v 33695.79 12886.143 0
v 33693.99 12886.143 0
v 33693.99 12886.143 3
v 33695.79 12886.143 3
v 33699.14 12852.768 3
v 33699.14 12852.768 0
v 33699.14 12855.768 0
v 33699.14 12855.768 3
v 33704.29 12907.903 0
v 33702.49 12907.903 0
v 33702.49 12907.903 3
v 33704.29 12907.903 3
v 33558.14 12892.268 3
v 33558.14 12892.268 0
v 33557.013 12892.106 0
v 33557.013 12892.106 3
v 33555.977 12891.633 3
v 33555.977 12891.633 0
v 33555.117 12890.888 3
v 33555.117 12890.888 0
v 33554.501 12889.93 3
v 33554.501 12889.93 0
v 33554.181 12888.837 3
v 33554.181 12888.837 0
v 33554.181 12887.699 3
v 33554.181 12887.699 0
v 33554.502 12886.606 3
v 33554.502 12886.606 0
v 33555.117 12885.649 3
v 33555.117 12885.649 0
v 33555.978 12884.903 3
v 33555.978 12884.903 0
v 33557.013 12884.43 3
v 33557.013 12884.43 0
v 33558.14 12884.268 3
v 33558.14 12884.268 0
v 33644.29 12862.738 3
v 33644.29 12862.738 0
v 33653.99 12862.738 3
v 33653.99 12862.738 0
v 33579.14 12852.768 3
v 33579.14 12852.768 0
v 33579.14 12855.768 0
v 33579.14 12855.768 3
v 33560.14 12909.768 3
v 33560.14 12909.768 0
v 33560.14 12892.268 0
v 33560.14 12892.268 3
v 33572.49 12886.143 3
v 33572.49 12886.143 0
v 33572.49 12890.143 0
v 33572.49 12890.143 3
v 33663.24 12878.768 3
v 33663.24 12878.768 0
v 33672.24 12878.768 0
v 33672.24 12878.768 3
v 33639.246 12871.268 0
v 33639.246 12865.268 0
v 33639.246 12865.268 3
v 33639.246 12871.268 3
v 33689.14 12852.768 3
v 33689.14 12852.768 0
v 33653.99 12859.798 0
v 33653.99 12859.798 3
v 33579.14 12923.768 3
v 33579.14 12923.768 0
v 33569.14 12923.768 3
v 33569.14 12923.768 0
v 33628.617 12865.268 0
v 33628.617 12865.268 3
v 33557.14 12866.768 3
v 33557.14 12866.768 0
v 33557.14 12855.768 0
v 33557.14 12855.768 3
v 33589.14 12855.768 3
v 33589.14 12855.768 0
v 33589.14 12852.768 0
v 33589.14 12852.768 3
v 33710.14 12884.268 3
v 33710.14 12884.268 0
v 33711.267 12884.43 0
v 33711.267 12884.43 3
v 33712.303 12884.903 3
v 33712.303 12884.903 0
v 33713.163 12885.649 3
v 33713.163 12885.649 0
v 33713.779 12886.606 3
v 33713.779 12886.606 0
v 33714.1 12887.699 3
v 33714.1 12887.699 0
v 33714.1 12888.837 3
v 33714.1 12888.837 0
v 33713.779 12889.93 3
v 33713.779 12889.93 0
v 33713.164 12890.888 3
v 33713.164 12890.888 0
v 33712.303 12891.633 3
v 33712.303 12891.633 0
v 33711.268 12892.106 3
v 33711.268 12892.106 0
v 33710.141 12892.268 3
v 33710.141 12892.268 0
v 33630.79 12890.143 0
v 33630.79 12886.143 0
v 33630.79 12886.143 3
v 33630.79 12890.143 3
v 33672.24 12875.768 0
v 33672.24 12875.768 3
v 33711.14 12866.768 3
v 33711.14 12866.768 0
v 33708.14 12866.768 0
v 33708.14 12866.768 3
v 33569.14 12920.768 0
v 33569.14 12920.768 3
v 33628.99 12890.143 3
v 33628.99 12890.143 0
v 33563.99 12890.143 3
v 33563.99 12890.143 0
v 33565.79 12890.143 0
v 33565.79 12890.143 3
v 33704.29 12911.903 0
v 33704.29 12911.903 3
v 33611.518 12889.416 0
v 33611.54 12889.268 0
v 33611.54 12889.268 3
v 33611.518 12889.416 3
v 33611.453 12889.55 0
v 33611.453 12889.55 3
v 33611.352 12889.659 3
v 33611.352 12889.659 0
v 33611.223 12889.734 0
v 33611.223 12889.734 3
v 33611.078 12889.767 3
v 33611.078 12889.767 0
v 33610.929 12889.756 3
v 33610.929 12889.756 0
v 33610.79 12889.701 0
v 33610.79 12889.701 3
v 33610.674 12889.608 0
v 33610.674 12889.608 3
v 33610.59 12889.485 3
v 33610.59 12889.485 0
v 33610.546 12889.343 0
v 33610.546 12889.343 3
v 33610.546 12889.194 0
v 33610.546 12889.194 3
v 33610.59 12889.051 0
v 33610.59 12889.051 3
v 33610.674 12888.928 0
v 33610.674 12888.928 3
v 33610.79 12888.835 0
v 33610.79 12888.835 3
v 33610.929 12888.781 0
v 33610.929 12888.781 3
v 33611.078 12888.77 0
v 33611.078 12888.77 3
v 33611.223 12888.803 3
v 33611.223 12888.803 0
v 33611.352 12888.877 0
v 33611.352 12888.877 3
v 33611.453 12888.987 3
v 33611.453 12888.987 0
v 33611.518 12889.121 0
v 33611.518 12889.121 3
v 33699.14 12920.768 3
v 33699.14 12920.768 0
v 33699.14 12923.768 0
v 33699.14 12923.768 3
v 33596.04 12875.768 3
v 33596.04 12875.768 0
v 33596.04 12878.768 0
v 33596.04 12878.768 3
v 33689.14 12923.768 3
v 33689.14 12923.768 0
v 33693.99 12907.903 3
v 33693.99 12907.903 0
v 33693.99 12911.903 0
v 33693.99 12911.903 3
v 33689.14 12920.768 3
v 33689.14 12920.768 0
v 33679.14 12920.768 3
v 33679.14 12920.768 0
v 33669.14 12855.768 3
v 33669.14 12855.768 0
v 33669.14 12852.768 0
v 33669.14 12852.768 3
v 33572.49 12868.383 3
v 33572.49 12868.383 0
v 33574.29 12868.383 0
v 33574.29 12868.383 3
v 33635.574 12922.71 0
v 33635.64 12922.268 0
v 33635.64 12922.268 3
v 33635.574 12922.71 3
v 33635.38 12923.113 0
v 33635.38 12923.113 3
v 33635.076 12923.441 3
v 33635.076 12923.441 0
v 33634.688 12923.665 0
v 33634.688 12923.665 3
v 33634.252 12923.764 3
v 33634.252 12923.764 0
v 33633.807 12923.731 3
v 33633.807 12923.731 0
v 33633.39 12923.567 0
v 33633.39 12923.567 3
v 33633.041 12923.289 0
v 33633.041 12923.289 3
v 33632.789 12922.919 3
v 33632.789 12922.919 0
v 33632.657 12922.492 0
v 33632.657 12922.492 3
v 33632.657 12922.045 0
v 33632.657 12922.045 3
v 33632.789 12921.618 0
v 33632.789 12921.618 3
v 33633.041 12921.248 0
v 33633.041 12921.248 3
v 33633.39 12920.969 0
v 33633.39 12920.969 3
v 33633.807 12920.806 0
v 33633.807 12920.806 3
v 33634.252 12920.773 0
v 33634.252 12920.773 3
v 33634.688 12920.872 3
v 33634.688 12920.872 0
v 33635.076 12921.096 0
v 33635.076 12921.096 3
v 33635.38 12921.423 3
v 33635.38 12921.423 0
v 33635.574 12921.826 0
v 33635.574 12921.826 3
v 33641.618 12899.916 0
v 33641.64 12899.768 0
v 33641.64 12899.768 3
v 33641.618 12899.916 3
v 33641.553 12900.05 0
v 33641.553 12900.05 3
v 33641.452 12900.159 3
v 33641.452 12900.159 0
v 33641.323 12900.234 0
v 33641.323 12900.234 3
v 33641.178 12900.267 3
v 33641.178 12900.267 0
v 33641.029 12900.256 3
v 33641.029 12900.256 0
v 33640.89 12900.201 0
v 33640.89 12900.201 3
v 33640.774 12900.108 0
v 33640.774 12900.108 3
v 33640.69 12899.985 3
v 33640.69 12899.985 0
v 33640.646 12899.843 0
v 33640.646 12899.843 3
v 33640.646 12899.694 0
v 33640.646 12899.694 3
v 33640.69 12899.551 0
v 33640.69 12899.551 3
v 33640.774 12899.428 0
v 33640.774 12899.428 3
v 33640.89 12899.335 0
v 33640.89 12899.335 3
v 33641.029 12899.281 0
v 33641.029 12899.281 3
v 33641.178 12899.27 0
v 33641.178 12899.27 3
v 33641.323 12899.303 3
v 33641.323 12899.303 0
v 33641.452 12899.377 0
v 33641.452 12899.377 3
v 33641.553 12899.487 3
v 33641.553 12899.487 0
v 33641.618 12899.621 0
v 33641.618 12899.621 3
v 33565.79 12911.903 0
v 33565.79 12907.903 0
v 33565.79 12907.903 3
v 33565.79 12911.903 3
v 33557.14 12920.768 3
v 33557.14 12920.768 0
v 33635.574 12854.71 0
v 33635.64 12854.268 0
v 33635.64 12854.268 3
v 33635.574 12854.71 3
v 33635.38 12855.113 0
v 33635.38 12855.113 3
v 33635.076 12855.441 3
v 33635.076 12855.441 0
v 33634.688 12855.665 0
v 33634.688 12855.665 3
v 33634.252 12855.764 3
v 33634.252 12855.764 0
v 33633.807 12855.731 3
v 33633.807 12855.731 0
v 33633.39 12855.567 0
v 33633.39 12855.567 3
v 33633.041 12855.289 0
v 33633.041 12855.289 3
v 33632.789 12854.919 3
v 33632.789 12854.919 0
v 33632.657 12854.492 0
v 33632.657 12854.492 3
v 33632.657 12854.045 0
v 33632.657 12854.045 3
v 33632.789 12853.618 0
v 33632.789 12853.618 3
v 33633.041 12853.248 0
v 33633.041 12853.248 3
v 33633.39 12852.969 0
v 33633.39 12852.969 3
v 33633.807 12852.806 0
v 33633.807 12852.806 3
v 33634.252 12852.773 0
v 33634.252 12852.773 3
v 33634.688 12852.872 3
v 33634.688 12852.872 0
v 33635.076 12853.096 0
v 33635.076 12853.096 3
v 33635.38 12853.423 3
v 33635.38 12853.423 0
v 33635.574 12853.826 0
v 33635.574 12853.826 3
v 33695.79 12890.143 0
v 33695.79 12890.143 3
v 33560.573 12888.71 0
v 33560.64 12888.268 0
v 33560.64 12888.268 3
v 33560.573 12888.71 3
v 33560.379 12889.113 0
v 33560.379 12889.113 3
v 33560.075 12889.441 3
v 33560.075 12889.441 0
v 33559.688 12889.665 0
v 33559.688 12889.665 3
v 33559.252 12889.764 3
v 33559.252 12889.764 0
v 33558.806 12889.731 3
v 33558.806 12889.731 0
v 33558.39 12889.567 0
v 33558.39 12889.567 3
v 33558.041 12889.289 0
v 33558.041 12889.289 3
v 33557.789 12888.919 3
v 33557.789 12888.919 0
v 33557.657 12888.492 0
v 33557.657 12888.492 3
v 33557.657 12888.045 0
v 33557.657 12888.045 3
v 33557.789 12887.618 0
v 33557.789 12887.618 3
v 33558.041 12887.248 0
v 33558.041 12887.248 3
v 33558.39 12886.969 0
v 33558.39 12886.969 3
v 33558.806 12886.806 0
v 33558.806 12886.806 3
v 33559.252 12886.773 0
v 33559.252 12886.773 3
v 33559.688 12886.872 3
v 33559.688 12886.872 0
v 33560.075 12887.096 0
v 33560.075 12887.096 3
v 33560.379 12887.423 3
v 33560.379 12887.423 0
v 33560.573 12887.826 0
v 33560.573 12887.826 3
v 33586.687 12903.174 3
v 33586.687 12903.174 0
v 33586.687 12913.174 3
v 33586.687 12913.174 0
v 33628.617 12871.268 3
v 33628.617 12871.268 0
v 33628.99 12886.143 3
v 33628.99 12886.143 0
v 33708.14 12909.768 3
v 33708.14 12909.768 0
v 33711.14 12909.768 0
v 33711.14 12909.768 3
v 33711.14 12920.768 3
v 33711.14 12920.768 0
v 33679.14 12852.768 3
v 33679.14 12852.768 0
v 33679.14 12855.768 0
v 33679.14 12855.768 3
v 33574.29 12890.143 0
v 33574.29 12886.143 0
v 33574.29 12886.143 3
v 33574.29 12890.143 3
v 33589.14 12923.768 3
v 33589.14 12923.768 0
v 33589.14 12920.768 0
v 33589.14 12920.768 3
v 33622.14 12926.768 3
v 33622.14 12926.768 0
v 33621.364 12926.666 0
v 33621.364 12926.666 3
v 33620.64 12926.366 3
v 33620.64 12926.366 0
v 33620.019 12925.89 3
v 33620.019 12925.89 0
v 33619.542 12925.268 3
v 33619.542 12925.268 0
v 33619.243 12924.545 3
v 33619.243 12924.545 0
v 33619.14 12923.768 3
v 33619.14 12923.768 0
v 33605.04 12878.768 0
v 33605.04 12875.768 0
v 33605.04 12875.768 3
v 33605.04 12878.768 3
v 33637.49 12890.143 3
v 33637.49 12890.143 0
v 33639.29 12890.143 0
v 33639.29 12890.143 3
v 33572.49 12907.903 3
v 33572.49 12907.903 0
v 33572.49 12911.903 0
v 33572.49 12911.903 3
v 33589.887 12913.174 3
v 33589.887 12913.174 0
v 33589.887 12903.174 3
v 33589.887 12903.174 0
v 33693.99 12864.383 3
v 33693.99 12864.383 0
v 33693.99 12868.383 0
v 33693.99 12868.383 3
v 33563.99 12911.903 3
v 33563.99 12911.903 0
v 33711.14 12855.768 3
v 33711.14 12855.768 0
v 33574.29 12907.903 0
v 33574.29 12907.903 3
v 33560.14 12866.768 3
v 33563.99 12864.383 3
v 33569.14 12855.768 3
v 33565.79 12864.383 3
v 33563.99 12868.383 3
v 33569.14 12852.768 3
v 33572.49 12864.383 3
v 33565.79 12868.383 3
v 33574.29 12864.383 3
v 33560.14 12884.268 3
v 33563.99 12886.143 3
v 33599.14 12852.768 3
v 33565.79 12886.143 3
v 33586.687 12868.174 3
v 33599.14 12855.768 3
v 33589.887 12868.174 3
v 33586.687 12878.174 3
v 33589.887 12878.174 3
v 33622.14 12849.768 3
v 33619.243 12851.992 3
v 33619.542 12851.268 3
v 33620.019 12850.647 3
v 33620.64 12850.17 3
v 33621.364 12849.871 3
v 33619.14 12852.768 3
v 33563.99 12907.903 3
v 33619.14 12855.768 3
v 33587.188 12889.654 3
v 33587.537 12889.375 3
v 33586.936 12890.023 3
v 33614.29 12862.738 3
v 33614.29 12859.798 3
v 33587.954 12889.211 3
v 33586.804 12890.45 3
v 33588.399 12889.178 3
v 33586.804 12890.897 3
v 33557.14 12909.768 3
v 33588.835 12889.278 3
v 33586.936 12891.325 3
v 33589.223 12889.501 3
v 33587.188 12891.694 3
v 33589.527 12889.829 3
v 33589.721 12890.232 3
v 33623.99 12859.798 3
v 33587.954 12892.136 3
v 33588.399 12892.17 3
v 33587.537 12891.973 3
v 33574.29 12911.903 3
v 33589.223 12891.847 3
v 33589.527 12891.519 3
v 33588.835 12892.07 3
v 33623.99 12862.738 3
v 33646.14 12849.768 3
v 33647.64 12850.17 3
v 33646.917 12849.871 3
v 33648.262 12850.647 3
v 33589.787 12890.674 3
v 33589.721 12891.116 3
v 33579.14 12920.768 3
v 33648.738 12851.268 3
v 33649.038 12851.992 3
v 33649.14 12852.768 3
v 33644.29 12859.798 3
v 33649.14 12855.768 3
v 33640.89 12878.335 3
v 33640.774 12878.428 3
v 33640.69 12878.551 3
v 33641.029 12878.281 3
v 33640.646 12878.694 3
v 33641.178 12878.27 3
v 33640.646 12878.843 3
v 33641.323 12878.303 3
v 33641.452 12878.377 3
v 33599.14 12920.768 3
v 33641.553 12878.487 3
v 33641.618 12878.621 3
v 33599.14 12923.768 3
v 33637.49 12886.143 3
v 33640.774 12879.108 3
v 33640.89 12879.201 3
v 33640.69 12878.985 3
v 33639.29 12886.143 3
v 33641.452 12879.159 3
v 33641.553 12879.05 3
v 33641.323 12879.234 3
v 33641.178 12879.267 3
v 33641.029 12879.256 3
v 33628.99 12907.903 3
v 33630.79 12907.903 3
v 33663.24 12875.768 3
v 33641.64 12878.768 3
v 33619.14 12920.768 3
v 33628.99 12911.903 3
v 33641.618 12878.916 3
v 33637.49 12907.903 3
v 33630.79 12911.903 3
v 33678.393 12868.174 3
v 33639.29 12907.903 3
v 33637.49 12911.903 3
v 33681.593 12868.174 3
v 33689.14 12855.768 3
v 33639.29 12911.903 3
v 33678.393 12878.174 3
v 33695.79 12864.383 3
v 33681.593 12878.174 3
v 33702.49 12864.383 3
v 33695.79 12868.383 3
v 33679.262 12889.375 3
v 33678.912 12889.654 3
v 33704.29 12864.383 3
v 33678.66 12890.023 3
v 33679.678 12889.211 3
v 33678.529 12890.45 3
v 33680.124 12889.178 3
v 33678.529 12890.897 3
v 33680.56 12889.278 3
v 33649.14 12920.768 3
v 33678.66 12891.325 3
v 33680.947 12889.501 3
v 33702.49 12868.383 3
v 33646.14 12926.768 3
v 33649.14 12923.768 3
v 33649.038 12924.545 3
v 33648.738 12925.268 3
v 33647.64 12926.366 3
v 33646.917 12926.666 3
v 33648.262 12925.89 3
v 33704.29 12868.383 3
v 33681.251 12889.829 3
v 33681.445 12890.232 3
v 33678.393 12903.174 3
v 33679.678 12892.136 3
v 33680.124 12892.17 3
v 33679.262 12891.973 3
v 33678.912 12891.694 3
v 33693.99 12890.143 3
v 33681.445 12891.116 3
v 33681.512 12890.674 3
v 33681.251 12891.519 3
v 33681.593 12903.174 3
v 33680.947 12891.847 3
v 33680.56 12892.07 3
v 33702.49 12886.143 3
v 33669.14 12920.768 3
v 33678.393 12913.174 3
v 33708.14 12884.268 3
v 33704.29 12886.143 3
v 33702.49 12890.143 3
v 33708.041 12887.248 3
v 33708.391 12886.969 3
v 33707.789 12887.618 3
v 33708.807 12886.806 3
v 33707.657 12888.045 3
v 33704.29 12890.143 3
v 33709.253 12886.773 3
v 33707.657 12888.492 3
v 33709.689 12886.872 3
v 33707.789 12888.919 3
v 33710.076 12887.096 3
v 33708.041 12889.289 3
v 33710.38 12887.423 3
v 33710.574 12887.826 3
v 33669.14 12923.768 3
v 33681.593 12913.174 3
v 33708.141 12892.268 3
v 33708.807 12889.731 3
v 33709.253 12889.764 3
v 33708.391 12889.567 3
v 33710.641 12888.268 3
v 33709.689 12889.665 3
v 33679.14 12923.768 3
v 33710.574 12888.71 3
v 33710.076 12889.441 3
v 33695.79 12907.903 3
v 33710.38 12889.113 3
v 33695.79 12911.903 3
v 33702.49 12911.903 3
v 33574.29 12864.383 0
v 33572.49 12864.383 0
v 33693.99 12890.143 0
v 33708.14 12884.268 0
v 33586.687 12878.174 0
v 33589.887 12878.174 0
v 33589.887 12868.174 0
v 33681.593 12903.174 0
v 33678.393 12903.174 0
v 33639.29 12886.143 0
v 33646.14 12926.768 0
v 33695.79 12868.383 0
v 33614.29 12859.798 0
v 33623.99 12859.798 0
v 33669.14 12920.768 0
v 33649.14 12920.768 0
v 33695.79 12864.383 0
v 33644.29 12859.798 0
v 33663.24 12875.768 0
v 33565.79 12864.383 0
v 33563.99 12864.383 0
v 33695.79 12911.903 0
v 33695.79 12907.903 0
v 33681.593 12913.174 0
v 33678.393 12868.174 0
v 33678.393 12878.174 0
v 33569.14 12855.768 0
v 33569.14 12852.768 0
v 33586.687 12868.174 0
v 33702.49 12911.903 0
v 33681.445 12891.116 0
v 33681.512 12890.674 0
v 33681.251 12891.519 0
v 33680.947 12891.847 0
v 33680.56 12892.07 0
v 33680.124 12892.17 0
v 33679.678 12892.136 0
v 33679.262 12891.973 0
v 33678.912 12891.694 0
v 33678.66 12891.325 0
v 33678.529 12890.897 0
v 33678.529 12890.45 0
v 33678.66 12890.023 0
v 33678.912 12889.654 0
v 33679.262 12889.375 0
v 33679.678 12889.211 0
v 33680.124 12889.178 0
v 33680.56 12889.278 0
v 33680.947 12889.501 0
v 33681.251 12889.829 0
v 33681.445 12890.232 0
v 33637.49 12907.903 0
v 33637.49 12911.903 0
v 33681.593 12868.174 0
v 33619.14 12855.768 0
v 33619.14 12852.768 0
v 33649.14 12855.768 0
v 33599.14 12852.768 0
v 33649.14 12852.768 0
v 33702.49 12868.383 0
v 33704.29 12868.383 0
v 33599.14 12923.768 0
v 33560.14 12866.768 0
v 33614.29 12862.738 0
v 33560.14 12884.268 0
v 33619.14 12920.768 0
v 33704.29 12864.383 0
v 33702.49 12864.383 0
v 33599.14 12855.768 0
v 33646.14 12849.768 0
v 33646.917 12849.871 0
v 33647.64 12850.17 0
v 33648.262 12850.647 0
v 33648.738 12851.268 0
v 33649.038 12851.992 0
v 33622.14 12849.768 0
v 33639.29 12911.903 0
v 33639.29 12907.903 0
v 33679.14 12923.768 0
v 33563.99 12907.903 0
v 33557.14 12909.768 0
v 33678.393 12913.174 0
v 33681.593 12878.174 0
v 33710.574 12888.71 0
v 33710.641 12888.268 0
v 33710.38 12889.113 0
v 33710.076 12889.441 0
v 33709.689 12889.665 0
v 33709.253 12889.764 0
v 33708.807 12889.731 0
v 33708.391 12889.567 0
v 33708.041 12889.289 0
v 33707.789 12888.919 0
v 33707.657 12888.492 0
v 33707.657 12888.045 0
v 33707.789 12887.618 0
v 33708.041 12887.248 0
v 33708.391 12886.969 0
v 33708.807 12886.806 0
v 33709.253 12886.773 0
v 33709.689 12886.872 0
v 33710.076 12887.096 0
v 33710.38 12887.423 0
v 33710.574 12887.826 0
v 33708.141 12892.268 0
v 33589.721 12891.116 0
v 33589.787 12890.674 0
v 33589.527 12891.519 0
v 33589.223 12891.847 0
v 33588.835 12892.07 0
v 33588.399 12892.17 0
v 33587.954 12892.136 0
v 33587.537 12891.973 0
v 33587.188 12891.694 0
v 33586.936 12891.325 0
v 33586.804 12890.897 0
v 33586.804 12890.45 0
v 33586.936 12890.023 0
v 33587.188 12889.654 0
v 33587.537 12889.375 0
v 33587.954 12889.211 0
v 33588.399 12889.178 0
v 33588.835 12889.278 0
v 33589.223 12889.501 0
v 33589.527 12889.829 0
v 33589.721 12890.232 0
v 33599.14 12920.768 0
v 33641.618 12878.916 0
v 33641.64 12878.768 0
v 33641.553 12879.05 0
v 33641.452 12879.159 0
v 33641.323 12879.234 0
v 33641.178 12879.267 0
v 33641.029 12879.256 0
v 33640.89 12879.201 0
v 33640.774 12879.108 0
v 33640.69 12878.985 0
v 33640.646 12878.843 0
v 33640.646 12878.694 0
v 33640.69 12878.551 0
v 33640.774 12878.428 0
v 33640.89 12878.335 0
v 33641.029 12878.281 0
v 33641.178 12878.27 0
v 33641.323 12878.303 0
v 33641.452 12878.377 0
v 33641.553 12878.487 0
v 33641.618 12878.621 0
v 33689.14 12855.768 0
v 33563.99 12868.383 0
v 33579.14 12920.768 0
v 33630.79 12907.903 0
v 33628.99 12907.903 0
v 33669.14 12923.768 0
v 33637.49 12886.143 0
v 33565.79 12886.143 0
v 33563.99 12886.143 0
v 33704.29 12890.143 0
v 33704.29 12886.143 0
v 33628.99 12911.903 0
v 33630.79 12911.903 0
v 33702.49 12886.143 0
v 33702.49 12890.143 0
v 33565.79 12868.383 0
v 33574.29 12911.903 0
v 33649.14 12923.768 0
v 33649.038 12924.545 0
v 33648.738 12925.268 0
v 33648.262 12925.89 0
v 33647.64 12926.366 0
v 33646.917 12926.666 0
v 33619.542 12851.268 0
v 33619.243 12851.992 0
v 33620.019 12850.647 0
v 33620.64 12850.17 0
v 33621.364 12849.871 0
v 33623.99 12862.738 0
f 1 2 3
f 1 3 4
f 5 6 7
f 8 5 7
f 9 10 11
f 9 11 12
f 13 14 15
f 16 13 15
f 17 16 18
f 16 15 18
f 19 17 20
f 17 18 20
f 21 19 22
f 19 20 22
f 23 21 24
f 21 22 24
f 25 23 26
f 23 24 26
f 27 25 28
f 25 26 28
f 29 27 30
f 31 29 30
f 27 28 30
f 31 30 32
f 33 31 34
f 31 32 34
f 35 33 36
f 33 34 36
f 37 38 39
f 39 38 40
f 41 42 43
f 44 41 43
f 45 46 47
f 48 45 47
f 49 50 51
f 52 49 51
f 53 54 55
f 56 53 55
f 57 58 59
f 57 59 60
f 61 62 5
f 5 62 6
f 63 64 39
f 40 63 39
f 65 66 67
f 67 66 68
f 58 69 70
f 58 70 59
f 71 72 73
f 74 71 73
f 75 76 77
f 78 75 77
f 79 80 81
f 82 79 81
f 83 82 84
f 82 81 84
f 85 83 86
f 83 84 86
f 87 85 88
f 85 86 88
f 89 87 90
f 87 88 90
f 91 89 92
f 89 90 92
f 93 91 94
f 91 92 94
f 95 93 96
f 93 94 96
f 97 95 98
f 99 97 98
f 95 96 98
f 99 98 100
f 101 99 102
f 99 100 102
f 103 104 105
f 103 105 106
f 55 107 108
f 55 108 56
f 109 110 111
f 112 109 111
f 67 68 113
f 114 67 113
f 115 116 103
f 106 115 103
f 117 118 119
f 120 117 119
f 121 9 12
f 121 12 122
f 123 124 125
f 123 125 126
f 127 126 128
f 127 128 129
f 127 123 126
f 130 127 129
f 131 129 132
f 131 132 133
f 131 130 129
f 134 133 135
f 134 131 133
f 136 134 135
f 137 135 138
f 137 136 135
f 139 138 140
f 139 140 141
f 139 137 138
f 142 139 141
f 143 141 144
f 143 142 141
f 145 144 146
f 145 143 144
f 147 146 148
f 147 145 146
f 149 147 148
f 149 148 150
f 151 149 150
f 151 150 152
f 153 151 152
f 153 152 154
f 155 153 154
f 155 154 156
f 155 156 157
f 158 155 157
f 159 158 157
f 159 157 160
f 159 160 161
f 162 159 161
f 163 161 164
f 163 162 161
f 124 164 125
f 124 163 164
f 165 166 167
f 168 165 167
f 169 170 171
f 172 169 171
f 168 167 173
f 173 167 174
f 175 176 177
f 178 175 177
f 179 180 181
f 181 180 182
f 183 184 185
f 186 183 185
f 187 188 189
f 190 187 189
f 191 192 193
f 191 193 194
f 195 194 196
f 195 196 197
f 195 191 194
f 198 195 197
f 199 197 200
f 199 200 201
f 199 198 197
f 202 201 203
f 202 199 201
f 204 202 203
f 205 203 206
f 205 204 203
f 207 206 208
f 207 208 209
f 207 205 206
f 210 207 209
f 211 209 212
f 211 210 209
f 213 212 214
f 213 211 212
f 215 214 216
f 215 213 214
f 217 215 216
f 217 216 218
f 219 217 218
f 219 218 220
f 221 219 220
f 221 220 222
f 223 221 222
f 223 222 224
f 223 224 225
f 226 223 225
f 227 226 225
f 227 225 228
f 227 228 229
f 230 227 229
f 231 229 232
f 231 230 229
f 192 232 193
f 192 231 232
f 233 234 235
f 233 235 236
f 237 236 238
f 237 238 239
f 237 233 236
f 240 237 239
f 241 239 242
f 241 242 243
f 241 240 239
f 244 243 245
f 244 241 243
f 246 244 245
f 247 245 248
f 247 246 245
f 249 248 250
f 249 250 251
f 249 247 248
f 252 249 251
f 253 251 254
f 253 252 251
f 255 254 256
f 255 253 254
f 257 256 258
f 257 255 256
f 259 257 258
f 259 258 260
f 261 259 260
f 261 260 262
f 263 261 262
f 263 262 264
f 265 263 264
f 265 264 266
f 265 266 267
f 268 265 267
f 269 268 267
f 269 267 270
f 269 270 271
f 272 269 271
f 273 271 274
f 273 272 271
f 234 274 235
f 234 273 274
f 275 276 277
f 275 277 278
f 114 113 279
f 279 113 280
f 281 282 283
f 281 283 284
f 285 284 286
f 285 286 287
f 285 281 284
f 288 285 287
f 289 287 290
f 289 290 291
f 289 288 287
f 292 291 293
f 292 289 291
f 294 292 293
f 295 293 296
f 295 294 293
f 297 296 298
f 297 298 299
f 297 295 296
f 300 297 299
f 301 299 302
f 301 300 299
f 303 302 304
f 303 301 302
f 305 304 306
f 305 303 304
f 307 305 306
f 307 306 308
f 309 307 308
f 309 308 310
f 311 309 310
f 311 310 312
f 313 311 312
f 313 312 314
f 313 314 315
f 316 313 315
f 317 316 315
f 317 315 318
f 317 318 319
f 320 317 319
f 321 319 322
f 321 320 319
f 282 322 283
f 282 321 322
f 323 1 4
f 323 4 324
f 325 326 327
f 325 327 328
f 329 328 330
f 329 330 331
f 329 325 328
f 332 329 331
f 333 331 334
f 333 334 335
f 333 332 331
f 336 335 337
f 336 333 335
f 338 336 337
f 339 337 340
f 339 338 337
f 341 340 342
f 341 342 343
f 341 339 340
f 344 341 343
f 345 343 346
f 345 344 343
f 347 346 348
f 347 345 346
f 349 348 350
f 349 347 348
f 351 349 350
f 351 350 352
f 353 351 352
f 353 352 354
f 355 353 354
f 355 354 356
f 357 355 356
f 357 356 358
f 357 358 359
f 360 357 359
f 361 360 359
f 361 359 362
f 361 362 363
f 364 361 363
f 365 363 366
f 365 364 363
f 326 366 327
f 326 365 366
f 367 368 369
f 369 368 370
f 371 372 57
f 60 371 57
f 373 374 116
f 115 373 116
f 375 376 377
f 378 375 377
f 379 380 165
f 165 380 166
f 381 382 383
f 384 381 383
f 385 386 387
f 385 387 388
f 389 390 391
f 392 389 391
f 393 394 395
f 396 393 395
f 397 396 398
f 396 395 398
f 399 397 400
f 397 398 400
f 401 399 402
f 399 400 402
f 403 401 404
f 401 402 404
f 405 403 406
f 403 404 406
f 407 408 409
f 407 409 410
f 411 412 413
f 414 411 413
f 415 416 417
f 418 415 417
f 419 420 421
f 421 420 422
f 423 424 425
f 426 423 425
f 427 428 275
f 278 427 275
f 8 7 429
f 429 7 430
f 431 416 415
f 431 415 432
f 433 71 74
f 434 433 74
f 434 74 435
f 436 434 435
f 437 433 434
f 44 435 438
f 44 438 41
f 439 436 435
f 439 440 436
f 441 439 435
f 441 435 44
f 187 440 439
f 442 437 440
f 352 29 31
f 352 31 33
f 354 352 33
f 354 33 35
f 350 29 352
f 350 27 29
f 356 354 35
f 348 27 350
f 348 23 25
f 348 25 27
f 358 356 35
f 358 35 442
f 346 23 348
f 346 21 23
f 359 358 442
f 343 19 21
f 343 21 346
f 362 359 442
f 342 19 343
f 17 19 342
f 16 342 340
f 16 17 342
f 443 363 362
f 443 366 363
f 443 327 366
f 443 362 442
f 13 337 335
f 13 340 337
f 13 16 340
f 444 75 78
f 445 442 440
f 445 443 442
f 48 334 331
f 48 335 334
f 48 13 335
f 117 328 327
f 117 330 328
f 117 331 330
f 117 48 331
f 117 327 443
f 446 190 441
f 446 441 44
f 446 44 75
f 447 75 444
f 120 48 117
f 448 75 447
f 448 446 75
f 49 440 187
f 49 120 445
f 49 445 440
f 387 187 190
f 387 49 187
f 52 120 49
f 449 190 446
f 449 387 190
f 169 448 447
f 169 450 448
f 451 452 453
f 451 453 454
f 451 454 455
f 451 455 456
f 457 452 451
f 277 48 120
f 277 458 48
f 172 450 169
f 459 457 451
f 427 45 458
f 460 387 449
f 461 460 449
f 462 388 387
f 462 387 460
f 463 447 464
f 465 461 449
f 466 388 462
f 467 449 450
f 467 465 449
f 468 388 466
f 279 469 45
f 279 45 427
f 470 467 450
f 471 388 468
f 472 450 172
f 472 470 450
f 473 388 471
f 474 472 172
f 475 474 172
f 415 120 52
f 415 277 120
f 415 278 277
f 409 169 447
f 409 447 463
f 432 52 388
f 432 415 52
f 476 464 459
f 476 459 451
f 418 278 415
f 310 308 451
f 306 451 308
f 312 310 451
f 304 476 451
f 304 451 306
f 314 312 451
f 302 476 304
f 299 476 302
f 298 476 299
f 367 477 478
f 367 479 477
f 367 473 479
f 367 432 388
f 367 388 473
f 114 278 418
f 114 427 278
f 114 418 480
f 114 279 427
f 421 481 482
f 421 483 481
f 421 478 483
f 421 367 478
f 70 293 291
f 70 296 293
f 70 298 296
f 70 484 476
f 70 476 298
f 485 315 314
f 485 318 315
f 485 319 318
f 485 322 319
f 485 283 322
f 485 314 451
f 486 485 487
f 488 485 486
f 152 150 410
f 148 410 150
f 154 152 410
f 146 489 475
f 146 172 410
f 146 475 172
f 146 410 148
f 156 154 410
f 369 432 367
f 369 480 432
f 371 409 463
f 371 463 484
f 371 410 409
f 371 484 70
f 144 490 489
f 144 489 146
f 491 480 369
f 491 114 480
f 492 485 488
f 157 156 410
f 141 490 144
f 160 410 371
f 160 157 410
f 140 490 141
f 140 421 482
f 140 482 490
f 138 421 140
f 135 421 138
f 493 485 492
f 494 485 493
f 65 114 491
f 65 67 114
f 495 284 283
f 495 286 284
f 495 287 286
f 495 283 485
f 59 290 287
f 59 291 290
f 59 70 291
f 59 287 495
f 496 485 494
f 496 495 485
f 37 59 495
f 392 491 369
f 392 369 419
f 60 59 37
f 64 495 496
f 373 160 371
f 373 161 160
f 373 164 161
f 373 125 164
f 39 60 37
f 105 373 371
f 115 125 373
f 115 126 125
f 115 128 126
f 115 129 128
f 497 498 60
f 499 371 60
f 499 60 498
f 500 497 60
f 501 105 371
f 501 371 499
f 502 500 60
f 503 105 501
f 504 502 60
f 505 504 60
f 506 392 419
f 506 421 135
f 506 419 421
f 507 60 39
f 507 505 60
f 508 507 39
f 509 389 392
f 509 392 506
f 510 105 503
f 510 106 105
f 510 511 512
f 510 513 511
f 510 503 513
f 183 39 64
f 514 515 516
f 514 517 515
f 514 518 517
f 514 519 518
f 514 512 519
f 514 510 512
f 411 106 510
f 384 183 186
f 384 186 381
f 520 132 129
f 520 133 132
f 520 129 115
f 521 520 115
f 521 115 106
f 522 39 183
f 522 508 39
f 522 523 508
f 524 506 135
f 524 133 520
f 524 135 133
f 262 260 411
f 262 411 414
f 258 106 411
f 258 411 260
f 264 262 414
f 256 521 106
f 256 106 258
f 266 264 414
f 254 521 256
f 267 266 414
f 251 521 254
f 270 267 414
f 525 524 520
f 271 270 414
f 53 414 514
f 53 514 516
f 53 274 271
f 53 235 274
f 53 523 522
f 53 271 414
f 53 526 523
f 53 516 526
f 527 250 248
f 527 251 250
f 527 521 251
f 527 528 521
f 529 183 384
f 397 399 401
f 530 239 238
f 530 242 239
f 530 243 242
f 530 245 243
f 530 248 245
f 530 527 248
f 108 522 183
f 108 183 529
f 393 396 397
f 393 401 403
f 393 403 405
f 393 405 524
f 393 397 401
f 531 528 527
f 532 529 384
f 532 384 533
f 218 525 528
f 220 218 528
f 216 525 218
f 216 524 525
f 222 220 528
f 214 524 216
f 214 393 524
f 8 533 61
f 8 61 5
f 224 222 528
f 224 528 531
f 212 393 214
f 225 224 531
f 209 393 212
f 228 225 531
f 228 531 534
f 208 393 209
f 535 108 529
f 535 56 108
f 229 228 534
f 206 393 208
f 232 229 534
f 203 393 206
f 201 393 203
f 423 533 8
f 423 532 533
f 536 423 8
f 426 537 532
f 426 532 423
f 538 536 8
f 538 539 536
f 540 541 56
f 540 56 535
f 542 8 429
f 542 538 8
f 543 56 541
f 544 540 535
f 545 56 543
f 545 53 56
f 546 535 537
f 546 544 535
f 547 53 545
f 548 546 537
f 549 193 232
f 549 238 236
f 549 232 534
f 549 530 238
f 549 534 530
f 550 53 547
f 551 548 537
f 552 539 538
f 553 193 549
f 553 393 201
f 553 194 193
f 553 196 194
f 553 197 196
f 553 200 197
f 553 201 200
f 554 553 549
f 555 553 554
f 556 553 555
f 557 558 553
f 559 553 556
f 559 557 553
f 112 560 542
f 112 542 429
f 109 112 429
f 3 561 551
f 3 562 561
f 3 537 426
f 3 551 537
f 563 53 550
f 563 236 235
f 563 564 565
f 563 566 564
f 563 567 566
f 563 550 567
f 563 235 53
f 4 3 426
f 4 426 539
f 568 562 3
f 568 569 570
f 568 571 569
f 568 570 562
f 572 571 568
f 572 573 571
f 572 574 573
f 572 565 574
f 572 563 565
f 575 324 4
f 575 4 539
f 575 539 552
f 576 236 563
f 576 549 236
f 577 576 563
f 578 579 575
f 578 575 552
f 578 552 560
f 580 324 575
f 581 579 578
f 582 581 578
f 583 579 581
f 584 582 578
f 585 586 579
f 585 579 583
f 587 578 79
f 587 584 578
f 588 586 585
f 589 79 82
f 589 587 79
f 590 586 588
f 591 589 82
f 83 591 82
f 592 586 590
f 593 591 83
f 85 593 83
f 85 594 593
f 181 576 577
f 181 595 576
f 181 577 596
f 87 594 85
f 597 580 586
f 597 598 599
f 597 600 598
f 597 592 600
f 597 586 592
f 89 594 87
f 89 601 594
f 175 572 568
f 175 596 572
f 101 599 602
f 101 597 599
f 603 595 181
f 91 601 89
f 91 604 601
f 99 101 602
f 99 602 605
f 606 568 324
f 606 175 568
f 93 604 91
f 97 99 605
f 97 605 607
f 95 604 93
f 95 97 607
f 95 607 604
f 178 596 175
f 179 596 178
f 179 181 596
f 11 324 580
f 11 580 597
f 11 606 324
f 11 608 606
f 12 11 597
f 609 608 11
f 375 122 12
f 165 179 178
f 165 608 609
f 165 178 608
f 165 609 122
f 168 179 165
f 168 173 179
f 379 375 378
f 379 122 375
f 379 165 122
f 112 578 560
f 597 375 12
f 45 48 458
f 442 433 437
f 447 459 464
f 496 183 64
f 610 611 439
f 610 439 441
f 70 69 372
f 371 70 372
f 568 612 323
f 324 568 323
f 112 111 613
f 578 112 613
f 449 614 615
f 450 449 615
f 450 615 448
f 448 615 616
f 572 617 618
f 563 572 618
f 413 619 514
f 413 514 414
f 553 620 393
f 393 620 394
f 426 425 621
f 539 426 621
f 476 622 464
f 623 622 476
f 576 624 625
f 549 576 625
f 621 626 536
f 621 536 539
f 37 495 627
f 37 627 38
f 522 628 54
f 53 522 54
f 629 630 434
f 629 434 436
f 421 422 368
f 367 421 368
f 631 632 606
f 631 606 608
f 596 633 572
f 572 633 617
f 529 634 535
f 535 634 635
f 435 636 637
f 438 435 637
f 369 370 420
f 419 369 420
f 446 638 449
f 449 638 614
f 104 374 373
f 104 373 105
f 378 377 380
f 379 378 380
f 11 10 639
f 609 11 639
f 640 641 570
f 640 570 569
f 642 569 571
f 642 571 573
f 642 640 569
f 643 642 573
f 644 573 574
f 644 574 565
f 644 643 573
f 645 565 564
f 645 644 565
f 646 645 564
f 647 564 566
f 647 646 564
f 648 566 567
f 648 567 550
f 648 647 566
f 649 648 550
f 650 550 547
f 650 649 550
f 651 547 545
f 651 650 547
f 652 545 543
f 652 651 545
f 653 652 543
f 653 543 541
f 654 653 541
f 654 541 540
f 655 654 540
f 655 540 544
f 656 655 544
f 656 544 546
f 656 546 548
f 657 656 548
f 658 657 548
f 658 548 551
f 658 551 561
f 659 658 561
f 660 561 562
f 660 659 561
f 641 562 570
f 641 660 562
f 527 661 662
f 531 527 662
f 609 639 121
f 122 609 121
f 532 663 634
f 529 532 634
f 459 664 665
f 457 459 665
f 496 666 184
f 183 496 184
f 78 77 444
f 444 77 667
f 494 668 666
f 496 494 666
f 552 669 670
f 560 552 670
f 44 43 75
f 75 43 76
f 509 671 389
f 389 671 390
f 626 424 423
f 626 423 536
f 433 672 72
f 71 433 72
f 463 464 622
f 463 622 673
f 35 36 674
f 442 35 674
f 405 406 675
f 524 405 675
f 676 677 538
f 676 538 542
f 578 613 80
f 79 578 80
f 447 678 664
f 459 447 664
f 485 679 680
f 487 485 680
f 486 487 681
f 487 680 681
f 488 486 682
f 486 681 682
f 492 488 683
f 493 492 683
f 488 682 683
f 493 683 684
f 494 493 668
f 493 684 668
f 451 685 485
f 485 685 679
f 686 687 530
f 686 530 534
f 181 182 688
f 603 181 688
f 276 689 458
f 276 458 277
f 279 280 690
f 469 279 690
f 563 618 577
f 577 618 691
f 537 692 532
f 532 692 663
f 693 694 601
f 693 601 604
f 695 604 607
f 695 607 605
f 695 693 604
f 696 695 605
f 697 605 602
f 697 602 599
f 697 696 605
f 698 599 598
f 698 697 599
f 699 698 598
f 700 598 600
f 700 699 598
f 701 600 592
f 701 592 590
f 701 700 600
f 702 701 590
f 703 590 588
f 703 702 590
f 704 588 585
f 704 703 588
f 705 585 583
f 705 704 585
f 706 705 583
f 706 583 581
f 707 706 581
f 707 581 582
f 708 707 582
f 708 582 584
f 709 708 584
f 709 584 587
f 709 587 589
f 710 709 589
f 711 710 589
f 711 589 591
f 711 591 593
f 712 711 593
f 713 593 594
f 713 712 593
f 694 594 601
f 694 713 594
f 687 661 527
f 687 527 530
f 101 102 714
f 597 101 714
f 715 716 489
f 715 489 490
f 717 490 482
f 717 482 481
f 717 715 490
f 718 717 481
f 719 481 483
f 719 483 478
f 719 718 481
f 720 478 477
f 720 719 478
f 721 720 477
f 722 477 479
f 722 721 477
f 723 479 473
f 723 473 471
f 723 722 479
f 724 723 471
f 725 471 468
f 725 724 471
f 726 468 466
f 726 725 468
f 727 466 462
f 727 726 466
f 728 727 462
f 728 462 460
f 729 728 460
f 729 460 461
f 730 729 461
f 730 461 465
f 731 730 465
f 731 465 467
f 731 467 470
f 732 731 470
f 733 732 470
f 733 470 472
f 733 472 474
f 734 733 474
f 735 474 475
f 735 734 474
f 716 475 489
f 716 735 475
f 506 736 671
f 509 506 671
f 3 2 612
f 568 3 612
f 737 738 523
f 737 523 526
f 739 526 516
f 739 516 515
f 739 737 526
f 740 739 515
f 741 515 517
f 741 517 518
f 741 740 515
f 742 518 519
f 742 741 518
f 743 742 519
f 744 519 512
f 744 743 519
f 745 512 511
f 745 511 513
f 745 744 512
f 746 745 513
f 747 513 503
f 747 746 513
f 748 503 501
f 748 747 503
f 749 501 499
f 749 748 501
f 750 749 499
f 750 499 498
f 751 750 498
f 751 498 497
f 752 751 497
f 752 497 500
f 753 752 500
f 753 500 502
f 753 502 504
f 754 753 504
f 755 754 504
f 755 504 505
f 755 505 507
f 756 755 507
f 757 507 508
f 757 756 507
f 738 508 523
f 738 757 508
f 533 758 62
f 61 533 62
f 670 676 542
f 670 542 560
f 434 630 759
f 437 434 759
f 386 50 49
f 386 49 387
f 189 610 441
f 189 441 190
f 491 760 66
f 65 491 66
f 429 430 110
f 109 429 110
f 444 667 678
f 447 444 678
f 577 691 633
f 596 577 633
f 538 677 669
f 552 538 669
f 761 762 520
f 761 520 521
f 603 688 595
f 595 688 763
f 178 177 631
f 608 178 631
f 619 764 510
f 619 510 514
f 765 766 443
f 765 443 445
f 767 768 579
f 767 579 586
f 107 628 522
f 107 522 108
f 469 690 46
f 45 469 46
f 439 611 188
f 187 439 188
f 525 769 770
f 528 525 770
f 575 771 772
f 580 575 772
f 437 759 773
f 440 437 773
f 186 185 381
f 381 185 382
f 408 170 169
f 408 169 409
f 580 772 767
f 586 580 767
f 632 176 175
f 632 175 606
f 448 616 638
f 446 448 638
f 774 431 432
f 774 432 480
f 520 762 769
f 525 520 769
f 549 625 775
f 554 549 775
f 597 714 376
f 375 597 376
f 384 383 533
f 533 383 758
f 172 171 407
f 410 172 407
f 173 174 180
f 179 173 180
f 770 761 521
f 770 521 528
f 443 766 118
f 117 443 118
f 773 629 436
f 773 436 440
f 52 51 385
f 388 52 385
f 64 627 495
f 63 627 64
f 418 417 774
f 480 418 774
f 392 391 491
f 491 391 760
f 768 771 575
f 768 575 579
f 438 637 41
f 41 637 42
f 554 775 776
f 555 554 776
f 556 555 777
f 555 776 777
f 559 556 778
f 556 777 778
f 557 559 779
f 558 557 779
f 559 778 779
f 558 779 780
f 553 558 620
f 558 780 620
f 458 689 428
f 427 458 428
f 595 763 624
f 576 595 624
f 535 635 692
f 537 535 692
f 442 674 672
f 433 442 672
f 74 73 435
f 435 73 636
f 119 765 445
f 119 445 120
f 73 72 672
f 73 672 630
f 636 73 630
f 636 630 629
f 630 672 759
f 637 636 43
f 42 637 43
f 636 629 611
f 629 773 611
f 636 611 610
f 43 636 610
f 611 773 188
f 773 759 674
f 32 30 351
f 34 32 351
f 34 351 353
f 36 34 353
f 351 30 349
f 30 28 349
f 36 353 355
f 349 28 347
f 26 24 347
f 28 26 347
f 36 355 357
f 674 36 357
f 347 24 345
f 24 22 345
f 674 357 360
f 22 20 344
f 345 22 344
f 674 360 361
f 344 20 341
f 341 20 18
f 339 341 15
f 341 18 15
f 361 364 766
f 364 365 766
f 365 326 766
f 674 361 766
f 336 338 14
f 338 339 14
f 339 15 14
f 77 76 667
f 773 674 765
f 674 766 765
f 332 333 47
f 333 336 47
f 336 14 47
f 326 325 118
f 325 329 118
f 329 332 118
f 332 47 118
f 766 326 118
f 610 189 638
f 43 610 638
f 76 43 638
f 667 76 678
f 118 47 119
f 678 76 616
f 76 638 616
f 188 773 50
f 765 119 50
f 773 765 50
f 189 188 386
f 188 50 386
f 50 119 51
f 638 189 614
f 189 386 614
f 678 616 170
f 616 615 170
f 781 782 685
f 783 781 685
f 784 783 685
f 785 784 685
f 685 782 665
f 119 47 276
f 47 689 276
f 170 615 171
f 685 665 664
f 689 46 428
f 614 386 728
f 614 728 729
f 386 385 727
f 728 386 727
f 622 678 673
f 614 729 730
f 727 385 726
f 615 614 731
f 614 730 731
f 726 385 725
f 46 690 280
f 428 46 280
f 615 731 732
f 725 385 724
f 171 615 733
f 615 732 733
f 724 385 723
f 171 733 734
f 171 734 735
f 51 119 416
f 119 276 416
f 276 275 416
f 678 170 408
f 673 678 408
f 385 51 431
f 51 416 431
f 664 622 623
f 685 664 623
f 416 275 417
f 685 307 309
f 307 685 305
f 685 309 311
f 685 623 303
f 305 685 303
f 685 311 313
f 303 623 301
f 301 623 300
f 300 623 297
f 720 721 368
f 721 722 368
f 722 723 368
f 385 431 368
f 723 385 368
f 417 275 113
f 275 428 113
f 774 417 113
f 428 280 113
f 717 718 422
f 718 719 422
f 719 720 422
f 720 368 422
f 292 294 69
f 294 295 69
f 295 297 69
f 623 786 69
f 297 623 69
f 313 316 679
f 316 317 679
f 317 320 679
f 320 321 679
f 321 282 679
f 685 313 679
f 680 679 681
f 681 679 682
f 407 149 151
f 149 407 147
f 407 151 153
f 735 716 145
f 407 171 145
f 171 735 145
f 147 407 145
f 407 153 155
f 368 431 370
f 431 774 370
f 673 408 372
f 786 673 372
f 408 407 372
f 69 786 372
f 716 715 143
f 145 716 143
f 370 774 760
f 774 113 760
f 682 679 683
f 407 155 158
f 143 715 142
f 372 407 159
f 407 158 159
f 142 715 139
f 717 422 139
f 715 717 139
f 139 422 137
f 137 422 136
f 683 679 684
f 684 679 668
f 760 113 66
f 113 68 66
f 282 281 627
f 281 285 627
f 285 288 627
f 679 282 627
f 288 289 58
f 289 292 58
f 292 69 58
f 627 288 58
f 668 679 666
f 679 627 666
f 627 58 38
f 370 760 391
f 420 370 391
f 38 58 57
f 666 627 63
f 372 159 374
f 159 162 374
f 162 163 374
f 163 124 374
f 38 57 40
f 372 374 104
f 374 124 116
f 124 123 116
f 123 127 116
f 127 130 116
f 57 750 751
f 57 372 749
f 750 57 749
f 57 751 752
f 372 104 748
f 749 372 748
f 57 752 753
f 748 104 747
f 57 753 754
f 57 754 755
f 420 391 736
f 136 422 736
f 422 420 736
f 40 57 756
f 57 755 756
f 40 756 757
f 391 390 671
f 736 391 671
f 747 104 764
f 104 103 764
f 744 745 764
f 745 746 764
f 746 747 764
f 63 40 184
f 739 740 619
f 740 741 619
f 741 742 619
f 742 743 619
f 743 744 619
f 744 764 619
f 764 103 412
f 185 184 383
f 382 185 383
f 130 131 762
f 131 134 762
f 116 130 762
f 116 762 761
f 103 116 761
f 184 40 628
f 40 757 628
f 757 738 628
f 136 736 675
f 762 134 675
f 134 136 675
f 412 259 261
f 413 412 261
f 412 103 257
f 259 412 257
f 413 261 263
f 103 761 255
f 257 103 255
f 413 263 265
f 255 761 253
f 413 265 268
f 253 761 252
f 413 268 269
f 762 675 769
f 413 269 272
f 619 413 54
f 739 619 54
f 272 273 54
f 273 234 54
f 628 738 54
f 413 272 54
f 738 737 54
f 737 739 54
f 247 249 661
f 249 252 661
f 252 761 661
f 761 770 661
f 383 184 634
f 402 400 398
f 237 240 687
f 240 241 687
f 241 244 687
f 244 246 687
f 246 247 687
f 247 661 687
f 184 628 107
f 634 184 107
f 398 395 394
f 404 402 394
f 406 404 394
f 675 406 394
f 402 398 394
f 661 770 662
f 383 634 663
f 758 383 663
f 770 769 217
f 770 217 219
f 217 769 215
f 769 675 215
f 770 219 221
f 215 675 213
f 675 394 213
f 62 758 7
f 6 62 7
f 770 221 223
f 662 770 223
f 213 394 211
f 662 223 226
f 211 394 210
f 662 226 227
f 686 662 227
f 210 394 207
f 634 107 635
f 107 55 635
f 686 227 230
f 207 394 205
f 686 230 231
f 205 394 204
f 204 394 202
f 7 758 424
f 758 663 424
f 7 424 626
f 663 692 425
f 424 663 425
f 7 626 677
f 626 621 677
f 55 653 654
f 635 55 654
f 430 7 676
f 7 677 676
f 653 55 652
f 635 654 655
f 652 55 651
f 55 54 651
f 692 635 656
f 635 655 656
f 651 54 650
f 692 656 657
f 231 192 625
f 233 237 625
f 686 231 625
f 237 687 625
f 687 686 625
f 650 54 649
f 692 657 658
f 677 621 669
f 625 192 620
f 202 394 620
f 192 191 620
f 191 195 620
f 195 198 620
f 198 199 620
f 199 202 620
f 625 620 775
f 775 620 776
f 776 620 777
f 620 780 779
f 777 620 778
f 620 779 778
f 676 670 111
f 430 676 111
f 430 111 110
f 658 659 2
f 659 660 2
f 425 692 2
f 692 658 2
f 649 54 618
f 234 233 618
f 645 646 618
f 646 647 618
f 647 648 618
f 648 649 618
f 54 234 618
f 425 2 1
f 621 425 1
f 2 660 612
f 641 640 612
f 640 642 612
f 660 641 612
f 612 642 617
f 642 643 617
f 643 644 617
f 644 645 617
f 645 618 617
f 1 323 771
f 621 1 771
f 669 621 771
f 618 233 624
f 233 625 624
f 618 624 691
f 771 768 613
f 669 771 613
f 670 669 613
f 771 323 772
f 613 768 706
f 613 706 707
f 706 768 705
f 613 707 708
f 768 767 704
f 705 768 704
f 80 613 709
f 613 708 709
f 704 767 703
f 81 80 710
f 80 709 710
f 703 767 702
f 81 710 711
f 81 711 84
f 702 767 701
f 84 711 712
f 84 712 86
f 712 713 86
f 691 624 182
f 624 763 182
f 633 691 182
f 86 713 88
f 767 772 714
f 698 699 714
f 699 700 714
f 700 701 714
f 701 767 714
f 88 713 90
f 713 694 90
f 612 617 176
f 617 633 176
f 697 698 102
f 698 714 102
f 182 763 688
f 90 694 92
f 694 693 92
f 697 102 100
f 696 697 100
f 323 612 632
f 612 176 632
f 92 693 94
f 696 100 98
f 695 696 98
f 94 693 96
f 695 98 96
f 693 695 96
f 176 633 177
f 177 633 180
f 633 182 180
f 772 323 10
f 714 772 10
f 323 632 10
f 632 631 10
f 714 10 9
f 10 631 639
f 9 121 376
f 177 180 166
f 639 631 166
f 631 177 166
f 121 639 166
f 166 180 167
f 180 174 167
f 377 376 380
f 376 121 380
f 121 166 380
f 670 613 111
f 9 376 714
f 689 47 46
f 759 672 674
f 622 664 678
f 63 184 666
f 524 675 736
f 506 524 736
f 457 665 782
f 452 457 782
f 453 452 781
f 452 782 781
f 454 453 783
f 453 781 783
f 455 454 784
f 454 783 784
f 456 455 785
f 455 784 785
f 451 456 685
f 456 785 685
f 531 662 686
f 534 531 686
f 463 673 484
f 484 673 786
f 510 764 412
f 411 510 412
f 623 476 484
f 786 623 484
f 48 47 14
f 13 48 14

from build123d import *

# Parameters (mm, degrees)
CROQUIS2_R              = 0.5
CROQUIS2_R_2            = 1.5
CROQUIS2_W              = 1.8
CROQUIS2_H              = 4
CROQUIS2_W_2            = 9
CROQUIS2_H_2            = 3
CROQUIS2_W_3            = 9.7
CROQUIS2_H_3            = 2.94
CROQUIS2_W_4            = 10.628979849
CROQUIS2_H_4            = 6
SALIENTE_EXTRUIR1_DEPTH = 3


with BuildPart() as part:
    # Croquis2 → Saliente-Extruir1 (new body)
    with BuildSketch(Plane.XY):
        with BuildLine():
            Line((33708.140369107, 12866.76836421), (33708.140369107, 12884.268432106))
            Line((33708.140369107, 12884.268432106), (33710.140369103, 12884.268296333))
            ThreePointArc((33710.140369103, 12884.268296333), (33714.140640639, 12888.268024778), (33710.140912194, 12892.268296314))
            Line((33710.140912194, 12892.268296314), (33708.14091219, 12892.268296314))
            Line((33708.14091219, 12892.268296314), (33708.140369107, 12909.76836421))
            Line((33708.140369107, 12909.76836421), (33711.140369107, 12909.76836421))
            Line((33711.140369107, 12909.76836421), (33711.140369107, 12920.76836421))
            Line((33711.140369107, 12920.76836421), (33699.140369107, 12920.76836421))
            Line((33699.140369107, 12920.76836421), (33699.140369107, 12923.76836421))
            Line((33699.140369107, 12923.76836421), (33689.140369107, 12923.76836421))
            Line((33689.140369107, 12923.76836421), (33689.140369107, 12920.76836421))
            Line((33689.140369107, 12920.76836421), (33679.140369107, 12920.76836421))
            Line((33679.140369107, 12920.76836421), (33679.140369107, 12923.76836421))
            Line((33679.140369107, 12923.76836421), (33669.140369107, 12923.76836421))
            Line((33669.140369107, 12923.76836421), (33669.140369107, 12920.76836421))
            Line((33669.140369107, 12920.76836421), (33649.140369107, 12920.76836421))
            Line((33649.140369107, 12920.76836421), (33649.140369107, 12923.76836421))
            ThreePointArc((33649.140369107, 12923.76836421), (33648.261689451, 12925.889684554), (33646.140369107, 12926.76836421))
            Line((33646.140369107, 12926.76836421), (33622.140369107, 12926.76836421))
            ThreePointArc((33622.140369107, 12926.76836421), (33620.019048764, 12925.889684554), (33619.140369107, 12923.76836421))
            Line((33619.140369107, 12923.76836421), (33619.140369107, 12920.76836421))
            Line((33619.140369107, 12920.76836421), (33599.140369107, 12920.76836421))
            Line((33599.140369107, 12920.76836421), (33599.140369107, 12923.76836421))
            Line((33599.140369107, 12923.76836421), (33589.140369107, 12923.76836421))
            Line((33589.140369107, 12923.76836421), (33589.140369107, 12920.76836421))
            Line((33589.140369107, 12920.76836421), (33579.140369107, 12920.76836421))
            Line((33579.140369107, 12920.76836421), (33579.140369107, 12923.76836421))
            Line((33579.140369107, 12923.76836421), (33569.140369107, 12923.76836421))
            Line((33569.140369107, 12923.76836421), (33569.140369107, 12920.76836421))
            Line((33569.140369107, 12920.76836421), (33557.140369107, 12920.76836421))
            Line((33557.140369107, 12920.76836421), (33557.140369107, 12909.76836421))
            Line((33557.140369107, 12909.76836421), (33560.140369107, 12909.76836421))
            Line((33560.140369107, 12909.76836421), (33560.139826016, 12892.268432087))
            Line((33560.139826016, 12892.268432087), (33558.13982602, 12892.268296314))
            ThreePointArc((33558.13982602, 12892.268296314), (33554.140097575, 12888.268024778), (33558.140369112, 12884.268296333))
            Line((33558.140369112, 12884.268296333), (33560.140369107, 12884.268432106))
            Line((33560.140369107, 12884.268432106), (33560.140369107, 12866.76836421))
            Line((33560.140369107, 12866.76836421), (33559.115527824, 12866.76836421))
            Line((33559.115527824, 12866.76836421), (33558.815527824, 12866.76836421))
            Line((33558.815527824, 12866.76836421), (33557.140369107, 12866.76836421))
            Line((33557.140369107, 12866.76836421), (33557.140369107, 12861.352876793))
            Line((33557.140369107, 12861.352876793), (33557.140369107, 12861.058331403))
            Line((33557.140369107, 12861.058331403), (33557.140369107, 12855.76836421))
            Line((33557.140369107, 12855.76836421), (33569.140369107, 12855.76836421))
            Line((33569.140369107, 12855.76836421), (33569.140369107, 12852.76836421))
            Line((33569.140369107, 12852.76836421), (33579.140369107, 12852.76836421))
            Line((33579.140369107, 12852.76836421), (33579.140369107, 12855.76836421))
            Line((33579.140369107, 12855.76836421), (33589.140369107, 12855.76836421))
            Line((33589.140369107, 12855.76836421), (33589.140369107, 12852.76836421))
            Line((33589.140369107, 12852.76836421), (33599.140369107, 12852.76836421))
            Line((33599.140369107, 12852.76836421), (33599.140369107, 12855.76836421))
            Line((33599.140369107, 12855.76836421), (33609.140369107, 12855.76836421))
            Line((33609.140369107, 12855.76836421), (33619.140369107, 12855.76836421))
            Line((33619.140369107, 12855.76836421), (33619.140369107, 12852.76836421))
            ThreePointArc((33619.140369107, 12852.76836421), (33620.019048764, 12850.647043866), (33622.140369107, 12849.76836421))
            Line((33622.140369107, 12849.76836421), (33646.140369107, 12849.76836421))
            ThreePointArc((33646.140369107, 12849.76836421), (33648.261689451, 12850.647043866), (33649.140369107, 12852.76836421))
            Line((33649.140369107, 12852.76836421), (33649.140369107, 12855.76836421))
            Line((33649.140369107, 12855.76836421), (33659.140369107, 12855.76836421))
            Line((33659.140369107, 12855.76836421), (33665.009331237, 12855.76836421))
            Line((33665.009331237, 12855.76836421), (33665.309331237, 12855.76836421))
            Line((33665.309331237, 12855.76836421), (33669.140369107, 12855.76836421))
            Line((33669.140369107, 12855.76836421), (33669.140369107, 12852.76836421))
            Line((33669.140369107, 12852.76836421), (33679.140369107, 12852.76836421))
            Line((33679.140369107, 12852.76836421), (33679.140369107, 12855.76836421))
            Line((33679.140369107, 12855.76836421), (33685.009331237, 12855.76836421))
            Line((33685.009331237, 12855.76836421), (33685.309331237, 12855.76836421))
            Line((33685.309331237, 12855.76836421), (33689.140369107, 12855.76836421))
            Line((33689.140369107, 12855.76836421), (33689.140369107, 12852.76836421))
            Line((33689.140369107, 12852.76836421), (33699.140369107, 12852.76836421))
            Line((33699.140369107, 12852.76836421), (33699.140369107, 12855.76836421))
            Line((33699.140369107, 12855.76836421), (33711.140369107, 12855.76836421))
            Line((33711.140369107, 12855.76836421), (33711.140369107, 12866.76836421))
            Line((33711.140369107, 12866.76836421), (33708.140369107, 12866.76836421))
        make_face()
        with Locations((33641.140369107, 12899.76836421)):
            Circle(CROQUIS2_R, mode=Mode.SUBTRACT)
        with Locations((33641.140369107, 12878.76836421)):
            Circle(CROQUIS2_R, mode=Mode.SUBTRACT)
        with Locations((33680.011779321, 12890.673818632)):
            Circle(CROQUIS2_R_2, mode=Mode.SUBTRACT)
        with Locations((33588.287365241, 12890.673818632)):
            Circle(CROQUIS2_R_2, mode=Mode.SUBTRACT)
        with Locations((33611.040369107, 12889.26836421)):
            Circle(CROQUIS2_R, mode=Mode.SUBTRACT)
        with Locations((33709.140640651, 12888.26836421)):
            Circle(CROQUIS2_R_2, mode=Mode.SUBTRACT)
        with Locations((33559.140097564, 12888.26836421)):
            Circle(CROQUIS2_R_2, mode=Mode.SUBTRACT)
        with Locations((33634.140369107, 12922.26836421)):
            Circle(CROQUIS2_R_2, mode=Mode.SUBTRACT)
        with Locations((33634.140369107, 12854.26836421)):
            Circle(CROQUIS2_R_2, mode=Mode.SUBTRACT)
        Polygon((33589.787365241, 12868.173818632), (33586.787365241, 12868.173818632), (33586.687365241, 12868.173818632), (33586.687365241, 12878.173818632), (33586.787365241, 12878.173818632), (33589.787365241, 12878.173818632), (33589.887365241, 12878.173818632), (33589.887365241, 12868.173818632), align=None, mode=Mode.SUBTRACT)
        Polygon((33589.787365241, 12903.173818632), (33586.787365241, 12903.173818632), (33586.737365241, 12903.173818632), (33586.687365241, 12903.173818632), (33586.687365241, 12913.173818632), (33586.787365241, 12913.173818632), (33589.787365241, 12913.173818632), (33589.887365241, 12913.173818632), (33589.887365241, 12903.173818632), (33589.837365241, 12903.173818632), align=None, mode=Mode.SUBTRACT)
        Polygon((33681.493372973, 12868.173818632), (33678.493372973, 12868.173818632), (33678.393372973, 12868.173818632), (33678.393372973, 12878.173818632), (33678.493372973, 12878.173818632), (33681.493372973, 12878.173818632), (33681.593372973, 12878.173818632), (33681.593372973, 12868.173818632), align=None, mode=Mode.SUBTRACT)
        Polygon((33681.493372973, 12903.173818632), (33678.493372973, 12903.173818632), (33678.393372973, 12903.173818632), (33678.393372973, 12913.173818632), (33678.493372973, 12913.173818632), (33681.493372973, 12913.173818632), (33681.593372973, 12913.173818632), (33681.593372973, 12903.173818632), align=None, mode=Mode.SUBTRACT)
        with Locations((33564.890369107, 12909.90336421)):
            Rectangle(CROQUIS2_W, CROQUIS2_H, mode=Mode.SUBTRACT)
        with Locations((33573.390369107, 12909.90336421)):
            Rectangle(CROQUIS2_W, CROQUIS2_H, mode=Mode.SUBTRACT)
        with Locations((33564.890369107, 12888.14336421)):
            Rectangle(CROQUIS2_W, CROQUIS2_H, mode=Mode.SUBTRACT)
        with Locations((33573.390369107, 12888.14336421)):
            Rectangle(CROQUIS2_W, CROQUIS2_H, mode=Mode.SUBTRACT)
        with Locations((33564.890369107, 12866.38336421)):
            Rectangle(CROQUIS2_W, CROQUIS2_H, mode=Mode.SUBTRACT)
        with Locations((33573.390369107, 12866.38336421)):
            Rectangle(CROQUIS2_W, CROQUIS2_H, mode=Mode.SUBTRACT)
        with Locations((33600.540369107, 12877.26836421)):
            Rectangle(CROQUIS2_W_2, CROQUIS2_H_2, mode=Mode.SUBTRACT)
        with Locations((33619.140369107, 12861.26836421)):
            Rectangle(CROQUIS2_W_3, CROQUIS2_H_3, mode=Mode.SUBTRACT)
        with Locations((33633.931190824, 12868.26836421)):
            Rectangle(CROQUIS2_W_4, CROQUIS2_H_4, mode=Mode.SUBTRACT)
        with Locations((33629.890369107, 12888.14336421)):
            Rectangle(CROQUIS2_W, CROQUIS2_H, mode=Mode.SUBTRACT)
        with Locations((33638.390369107, 12888.14336421)):
            Rectangle(CROQUIS2_W, CROQUIS2_H, mode=Mode.SUBTRACT)
        with Locations((33638.390369107, 12909.90336421)):
            Rectangle(CROQUIS2_W, CROQUIS2_H, mode=Mode.SUBTRACT)
        with Locations((33629.890369107, 12909.90336421)):
            Rectangle(CROQUIS2_W, CROQUIS2_H, mode=Mode.SUBTRACT)
        with Locations((33649.140369107, 12861.26836421)):
            Rectangle(CROQUIS2_W_3, CROQUIS2_H_3, mode=Mode.SUBTRACT)
        with Locations((33667.740369107, 12877.26836421)):
            Rectangle(CROQUIS2_W_2, CROQUIS2_H_2, mode=Mode.SUBTRACT)
        with Locations((33694.890369107, 12909.90336421)):
            Rectangle(CROQUIS2_W, CROQUIS2_H, mode=Mode.SUBTRACT)
        with Locations((33703.390369107, 12909.90336421)):
            Rectangle(CROQUIS2_W, CROQUIS2_H, mode=Mode.SUBTRACT)
        with Locations((33694.890369107, 12888.14336421)):
            Rectangle(CROQUIS2_W, CROQUIS2_H, mode=Mode.SUBTRACT)
        with Locations((33703.390369107, 12888.14336421)):
            Rectangle(CROQUIS2_W, CROQUIS2_H, mode=Mode.SUBTRACT)
        with Locations((33694.890369107, 12866.38336421)):
            Rectangle(CROQUIS2_W, CROQUIS2_H, mode=Mode.SUBTRACT)
        with Locations((33703.390369107, 12866.38336421)):
            Rectangle(CROQUIS2_W, CROQUIS2_H, mode=Mode.SUBTRACT)
    extrude(amount=SALIENTE_EXTRUIR1_DEPTH)


solid = part.part
